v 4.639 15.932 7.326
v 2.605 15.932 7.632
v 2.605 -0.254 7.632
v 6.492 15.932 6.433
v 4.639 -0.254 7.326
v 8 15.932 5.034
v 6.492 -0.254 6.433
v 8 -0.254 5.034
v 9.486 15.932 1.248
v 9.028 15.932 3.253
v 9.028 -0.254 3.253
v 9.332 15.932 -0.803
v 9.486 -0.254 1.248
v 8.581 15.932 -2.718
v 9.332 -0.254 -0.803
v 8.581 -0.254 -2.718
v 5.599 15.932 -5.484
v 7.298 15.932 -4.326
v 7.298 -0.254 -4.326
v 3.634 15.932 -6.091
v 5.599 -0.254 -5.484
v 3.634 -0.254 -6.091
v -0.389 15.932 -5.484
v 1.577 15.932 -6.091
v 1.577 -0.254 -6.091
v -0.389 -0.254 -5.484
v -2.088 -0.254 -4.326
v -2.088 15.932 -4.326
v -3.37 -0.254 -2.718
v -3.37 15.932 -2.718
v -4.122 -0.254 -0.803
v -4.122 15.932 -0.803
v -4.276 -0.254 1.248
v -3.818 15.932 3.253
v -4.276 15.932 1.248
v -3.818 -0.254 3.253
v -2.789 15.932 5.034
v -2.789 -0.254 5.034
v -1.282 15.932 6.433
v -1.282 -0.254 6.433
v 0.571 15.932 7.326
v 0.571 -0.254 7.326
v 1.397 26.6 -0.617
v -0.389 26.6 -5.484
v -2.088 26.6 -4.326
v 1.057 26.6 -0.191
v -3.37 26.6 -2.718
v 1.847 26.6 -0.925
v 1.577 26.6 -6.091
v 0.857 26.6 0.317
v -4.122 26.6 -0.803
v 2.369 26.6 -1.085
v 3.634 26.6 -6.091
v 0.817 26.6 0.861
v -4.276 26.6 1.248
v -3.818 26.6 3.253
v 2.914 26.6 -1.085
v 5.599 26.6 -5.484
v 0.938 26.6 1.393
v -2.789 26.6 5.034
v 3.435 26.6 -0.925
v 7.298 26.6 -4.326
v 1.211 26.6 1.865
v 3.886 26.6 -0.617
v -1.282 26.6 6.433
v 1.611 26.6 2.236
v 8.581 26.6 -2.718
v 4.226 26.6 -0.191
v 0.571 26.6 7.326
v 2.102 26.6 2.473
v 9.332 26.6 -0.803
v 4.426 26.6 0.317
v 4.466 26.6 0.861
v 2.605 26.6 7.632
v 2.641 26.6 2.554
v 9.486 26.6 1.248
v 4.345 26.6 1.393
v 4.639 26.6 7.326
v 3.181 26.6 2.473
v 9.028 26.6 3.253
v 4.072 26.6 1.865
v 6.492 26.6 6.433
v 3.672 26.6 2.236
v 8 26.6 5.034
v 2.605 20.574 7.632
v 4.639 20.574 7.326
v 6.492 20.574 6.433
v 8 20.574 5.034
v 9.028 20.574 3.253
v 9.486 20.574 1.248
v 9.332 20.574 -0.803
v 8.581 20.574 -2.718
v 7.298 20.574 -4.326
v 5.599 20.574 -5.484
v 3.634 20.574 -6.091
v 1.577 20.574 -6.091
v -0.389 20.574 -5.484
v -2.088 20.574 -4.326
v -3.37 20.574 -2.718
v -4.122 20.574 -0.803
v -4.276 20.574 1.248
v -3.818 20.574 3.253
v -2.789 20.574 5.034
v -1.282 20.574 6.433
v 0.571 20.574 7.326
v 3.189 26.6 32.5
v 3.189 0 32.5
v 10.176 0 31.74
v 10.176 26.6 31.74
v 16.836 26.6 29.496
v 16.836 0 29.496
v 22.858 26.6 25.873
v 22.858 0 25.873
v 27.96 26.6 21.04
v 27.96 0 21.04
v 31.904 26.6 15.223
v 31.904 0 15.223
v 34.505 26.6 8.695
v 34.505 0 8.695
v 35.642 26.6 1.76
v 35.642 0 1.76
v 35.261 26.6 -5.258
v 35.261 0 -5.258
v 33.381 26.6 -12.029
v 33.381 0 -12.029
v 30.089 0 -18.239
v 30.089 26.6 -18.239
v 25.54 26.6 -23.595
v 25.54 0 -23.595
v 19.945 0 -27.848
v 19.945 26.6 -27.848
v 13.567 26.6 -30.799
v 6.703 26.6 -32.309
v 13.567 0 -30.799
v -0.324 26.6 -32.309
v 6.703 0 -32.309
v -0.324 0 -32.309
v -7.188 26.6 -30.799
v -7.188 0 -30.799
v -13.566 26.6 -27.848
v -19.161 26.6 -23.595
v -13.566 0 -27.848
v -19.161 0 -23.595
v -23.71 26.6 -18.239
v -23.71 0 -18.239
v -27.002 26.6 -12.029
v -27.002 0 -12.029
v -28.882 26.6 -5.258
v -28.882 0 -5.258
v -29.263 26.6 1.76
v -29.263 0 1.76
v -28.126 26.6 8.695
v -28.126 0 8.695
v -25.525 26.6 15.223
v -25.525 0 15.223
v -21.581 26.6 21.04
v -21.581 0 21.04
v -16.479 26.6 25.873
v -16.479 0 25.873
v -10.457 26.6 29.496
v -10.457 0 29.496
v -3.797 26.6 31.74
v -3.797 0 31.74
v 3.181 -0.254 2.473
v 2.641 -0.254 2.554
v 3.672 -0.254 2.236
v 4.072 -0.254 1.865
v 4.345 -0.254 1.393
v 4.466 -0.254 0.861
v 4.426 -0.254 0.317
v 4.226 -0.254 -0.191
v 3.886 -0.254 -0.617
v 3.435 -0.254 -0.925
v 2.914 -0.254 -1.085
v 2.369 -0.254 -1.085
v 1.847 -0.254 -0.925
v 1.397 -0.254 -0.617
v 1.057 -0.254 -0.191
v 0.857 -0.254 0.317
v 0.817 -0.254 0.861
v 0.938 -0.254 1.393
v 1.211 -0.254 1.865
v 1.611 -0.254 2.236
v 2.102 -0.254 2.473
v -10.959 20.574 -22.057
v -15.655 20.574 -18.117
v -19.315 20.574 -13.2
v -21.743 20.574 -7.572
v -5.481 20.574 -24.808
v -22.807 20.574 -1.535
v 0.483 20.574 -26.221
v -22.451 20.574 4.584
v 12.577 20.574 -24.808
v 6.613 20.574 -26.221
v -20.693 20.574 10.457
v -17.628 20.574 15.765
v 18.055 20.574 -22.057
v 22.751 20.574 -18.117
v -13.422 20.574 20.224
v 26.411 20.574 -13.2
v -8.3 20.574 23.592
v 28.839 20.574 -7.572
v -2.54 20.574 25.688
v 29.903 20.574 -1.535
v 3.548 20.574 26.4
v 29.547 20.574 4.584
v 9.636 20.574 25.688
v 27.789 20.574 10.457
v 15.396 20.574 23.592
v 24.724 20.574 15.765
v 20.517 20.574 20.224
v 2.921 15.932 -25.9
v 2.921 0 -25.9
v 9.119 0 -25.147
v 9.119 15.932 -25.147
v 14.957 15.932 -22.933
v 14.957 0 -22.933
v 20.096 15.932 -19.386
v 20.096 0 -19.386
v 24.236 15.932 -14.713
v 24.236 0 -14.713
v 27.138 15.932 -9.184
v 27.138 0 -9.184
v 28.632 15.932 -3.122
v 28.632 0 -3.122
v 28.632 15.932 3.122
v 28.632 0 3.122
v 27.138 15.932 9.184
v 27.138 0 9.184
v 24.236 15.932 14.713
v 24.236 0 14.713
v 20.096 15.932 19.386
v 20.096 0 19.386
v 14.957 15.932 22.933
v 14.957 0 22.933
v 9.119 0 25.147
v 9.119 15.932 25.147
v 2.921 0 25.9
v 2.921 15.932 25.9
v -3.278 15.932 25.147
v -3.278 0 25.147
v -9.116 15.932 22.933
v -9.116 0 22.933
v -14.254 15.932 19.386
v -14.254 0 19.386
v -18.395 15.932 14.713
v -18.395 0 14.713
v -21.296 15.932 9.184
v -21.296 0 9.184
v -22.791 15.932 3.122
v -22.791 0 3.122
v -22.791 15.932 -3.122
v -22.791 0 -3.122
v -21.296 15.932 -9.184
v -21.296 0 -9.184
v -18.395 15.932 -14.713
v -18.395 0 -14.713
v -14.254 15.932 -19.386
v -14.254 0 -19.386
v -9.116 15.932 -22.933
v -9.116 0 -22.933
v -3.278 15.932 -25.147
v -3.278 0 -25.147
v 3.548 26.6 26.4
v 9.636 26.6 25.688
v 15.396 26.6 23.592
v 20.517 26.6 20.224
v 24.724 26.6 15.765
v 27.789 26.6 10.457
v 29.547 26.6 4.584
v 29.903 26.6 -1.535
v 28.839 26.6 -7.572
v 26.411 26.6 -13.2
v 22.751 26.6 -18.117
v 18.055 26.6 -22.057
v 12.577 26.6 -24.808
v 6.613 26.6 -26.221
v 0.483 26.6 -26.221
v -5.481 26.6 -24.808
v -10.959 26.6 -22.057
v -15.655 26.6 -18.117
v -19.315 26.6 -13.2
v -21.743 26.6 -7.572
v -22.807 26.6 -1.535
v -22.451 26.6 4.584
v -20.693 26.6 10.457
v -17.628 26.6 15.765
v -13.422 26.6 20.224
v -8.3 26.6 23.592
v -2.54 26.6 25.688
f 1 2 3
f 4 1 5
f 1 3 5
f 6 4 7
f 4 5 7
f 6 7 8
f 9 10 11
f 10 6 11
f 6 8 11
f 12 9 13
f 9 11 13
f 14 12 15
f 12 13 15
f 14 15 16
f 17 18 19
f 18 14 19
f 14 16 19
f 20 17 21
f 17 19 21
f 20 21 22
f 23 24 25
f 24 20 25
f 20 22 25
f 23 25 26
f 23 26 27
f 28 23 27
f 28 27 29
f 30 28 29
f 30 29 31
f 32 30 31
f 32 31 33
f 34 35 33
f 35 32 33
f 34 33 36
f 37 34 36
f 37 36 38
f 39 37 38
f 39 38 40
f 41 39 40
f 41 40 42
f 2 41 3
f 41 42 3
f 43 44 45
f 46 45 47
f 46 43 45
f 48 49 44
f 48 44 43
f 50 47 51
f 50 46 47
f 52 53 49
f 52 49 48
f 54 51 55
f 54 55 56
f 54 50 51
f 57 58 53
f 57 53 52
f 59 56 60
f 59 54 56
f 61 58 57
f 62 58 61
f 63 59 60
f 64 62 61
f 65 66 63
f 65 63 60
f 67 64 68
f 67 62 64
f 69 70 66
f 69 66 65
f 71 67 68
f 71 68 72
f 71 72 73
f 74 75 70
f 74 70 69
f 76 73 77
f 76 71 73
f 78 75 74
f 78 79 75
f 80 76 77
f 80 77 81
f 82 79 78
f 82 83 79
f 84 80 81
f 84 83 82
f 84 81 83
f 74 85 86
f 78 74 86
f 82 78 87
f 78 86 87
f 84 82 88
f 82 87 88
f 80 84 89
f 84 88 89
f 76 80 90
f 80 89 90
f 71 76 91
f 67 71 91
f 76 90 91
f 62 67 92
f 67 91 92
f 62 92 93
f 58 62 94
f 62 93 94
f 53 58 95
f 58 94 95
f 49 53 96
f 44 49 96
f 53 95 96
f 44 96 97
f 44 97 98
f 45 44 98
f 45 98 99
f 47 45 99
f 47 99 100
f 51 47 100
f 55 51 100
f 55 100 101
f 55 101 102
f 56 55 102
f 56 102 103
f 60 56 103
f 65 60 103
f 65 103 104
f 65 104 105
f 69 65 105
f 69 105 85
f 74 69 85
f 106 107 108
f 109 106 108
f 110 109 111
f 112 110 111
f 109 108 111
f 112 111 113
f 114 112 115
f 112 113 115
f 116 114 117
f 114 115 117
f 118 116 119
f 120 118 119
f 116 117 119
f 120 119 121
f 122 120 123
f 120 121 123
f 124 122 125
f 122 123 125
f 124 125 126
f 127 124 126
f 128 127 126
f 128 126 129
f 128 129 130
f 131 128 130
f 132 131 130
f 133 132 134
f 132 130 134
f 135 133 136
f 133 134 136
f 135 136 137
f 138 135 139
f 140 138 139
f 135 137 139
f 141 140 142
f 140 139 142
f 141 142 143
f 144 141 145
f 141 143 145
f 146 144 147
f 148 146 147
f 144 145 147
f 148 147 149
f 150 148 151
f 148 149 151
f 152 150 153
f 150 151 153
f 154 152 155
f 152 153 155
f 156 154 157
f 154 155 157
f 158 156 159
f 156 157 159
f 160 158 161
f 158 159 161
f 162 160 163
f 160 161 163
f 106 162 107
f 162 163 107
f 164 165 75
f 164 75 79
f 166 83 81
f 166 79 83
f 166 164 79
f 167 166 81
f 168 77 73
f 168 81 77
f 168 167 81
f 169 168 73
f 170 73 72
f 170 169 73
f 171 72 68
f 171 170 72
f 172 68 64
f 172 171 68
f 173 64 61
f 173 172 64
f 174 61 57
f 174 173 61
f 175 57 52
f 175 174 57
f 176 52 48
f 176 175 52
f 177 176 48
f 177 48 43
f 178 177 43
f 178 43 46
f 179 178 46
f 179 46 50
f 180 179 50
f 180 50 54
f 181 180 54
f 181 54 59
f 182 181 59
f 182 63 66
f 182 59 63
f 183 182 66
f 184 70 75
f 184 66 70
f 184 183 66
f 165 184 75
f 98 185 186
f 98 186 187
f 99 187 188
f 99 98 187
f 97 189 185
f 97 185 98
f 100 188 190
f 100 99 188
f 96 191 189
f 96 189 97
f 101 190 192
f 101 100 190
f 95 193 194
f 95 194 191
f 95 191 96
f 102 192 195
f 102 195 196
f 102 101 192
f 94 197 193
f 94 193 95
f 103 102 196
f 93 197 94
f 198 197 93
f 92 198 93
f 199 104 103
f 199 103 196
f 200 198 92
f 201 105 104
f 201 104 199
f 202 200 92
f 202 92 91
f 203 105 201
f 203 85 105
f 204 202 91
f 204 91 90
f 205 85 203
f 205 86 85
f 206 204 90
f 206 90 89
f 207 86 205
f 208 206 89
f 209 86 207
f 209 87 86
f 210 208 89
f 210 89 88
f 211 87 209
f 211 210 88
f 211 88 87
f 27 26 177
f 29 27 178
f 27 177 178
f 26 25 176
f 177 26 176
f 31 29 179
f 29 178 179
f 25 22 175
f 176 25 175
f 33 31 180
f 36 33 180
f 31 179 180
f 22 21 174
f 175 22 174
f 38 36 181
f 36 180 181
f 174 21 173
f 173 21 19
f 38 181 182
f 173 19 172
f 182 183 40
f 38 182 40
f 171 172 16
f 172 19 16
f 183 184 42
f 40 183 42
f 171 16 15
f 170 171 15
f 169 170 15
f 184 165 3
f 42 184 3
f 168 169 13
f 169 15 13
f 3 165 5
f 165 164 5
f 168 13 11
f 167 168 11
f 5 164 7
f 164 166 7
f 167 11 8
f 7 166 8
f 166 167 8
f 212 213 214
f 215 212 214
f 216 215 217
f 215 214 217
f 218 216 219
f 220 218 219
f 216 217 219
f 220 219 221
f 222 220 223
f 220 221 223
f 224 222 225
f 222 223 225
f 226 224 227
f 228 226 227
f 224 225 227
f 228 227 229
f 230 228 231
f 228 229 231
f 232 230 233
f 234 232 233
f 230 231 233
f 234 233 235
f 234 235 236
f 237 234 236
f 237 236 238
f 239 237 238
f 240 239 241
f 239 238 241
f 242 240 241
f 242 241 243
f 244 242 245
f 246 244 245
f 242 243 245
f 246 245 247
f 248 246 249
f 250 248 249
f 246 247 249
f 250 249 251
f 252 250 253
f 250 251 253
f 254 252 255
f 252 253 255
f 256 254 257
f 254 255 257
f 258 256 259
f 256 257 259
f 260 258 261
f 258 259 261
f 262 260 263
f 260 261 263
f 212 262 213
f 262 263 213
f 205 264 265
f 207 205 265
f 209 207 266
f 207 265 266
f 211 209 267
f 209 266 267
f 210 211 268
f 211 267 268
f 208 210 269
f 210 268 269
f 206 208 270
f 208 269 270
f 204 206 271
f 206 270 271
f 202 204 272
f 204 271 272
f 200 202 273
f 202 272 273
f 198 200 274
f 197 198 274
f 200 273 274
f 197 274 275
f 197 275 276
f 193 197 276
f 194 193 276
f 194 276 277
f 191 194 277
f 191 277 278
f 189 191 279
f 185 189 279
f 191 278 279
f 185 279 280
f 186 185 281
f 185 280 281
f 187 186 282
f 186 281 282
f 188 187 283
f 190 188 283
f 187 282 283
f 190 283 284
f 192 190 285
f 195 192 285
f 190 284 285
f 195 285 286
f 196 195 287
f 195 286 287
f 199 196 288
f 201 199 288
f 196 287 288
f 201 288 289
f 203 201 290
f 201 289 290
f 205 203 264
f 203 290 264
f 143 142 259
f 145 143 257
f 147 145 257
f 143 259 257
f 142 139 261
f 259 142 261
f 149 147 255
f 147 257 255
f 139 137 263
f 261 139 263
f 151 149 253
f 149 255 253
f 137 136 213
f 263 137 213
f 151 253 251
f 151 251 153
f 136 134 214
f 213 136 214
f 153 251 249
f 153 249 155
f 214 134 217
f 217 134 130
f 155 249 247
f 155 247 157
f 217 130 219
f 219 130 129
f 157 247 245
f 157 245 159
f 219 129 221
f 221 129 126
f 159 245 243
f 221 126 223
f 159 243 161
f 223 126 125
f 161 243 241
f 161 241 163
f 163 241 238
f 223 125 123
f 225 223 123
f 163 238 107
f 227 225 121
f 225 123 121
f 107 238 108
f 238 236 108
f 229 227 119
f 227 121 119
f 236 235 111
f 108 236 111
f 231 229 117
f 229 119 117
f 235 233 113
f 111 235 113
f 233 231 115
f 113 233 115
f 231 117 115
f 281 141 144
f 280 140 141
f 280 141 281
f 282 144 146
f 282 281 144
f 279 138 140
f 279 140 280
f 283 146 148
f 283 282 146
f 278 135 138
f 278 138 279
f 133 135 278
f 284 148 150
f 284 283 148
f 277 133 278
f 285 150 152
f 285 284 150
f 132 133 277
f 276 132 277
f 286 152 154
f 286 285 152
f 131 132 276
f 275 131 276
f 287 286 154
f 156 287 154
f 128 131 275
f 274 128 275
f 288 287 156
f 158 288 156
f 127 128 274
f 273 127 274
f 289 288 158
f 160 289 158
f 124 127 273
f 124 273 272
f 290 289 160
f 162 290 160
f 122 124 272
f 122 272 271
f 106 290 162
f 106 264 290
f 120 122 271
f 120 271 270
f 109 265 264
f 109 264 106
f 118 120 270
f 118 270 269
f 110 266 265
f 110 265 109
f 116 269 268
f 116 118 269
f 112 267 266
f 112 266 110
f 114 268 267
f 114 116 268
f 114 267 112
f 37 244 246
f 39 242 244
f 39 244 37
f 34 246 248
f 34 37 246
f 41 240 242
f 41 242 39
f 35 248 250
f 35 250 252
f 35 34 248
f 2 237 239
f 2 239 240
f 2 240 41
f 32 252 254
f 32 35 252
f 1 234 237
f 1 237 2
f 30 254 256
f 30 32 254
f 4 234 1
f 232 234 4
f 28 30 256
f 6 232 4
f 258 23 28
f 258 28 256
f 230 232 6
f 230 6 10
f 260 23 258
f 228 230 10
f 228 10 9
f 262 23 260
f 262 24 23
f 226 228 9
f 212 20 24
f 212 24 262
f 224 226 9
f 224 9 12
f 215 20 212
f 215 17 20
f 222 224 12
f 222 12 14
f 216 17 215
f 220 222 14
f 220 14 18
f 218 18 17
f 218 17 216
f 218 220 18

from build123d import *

# Parameters (mm, degrees)
SKETCH1_R                = 32.5
BOSS_EXTRUDE1_DEPTH      = 26.6
SKETCH2_R                = 26.4
CUT_EXTRUDE1_DEPTH       = 6.026
SKETCH5_R                = 25.9
CUT_EXTRUDE2_DEPTH       = 15.932
BOSS_EXTRUDE2_DEPTH      = 6.026
BOSS_EXTRUDE2_DEPTH_BACK = 20.828
SKETCH6_R                = 6.9
CUT_EXTRUDE3_DEPTH       = 13.462
CUT_EXTRUDE3_DEPTH_BACK  = 49.714
SKETCH7_R                = 1.83


with BuildPart() as part:
    # Sketch1 → Boss-Extrude1 (new body)
    with BuildSketch(Plane(origin=(0, 0, 0), x_dir=(1, 0, 0), z_dir=(0, 1, 0))):
        with Locations(Location((3.189451159, 0, 0), (0, 0, 270))):
            Circle(SKETCH1_R)
    extrude(amount=BOSS_EXTRUDE1_DEPTH)

    # Sketch2 → Cut-Extrude1 (cut)
    with BuildSketch(Plane(origin=(0, 26.6, 0), x_dir=(1, 0, 0), z_dir=(0, 1, 0))):
        with Locations(Location((3.547856728, 0, 0), (0, 0, 270))):
            Circle(SKETCH2_R)
    extrude(amount=-CUT_EXTRUDE1_DEPTH, mode=Mode.SUBTRACT)

    # Sketch5 → Cut-Extrude2 (cut)
    with BuildSketch(Plane.XZ):
        with Locations(Location((2.920646982, 0, 0), (0, 0, 270))):
            Circle(SKETCH5_R)
    extrude(amount=-CUT_EXTRUDE2_DEPTH, mode=Mode.SUBTRACT)

    # Sketch6 → Boss-Extrude2 (add, two sides: drawn at the far end of the back side and taken through both)
    with BuildSketch(Plane(origin=(0, 20.574, 0), x_dir=(1, 0, 0), z_dir=(0, 1, 0)).offset(-BOSS_EXTRUDE2_DEPTH_BACK)):
        with Locations(Location((2.605158488, -0.732268174, 0), (0, 0, 270))):
            Circle(SKETCH6_R)
    extrude(amount=BOSS_EXTRUDE2_DEPTH + BOSS_EXTRUDE2_DEPTH_BACK)

    # Sketch7 → Cut-Extrude3 (cut, two sides: drawn at the far end of the back side and taken through both)
    with BuildSketch(Plane(origin=(0, 26.6, 0), x_dir=(1, 0, 0), z_dir=(0, 1, 0)).offset(-CUT_EXTRUDE3_DEPTH_BACK)):
        with Locations(Location((2.641417448, -0.724168536, 0), (0, 0, 270))):
            Circle(SKETCH7_R)
    extrude(amount=CUT_EXTRUDE3_DEPTH + CUT_EXTRUDE3_DEPTH_BACK, mode=Mode.SUBTRACT)


solid = part.part
